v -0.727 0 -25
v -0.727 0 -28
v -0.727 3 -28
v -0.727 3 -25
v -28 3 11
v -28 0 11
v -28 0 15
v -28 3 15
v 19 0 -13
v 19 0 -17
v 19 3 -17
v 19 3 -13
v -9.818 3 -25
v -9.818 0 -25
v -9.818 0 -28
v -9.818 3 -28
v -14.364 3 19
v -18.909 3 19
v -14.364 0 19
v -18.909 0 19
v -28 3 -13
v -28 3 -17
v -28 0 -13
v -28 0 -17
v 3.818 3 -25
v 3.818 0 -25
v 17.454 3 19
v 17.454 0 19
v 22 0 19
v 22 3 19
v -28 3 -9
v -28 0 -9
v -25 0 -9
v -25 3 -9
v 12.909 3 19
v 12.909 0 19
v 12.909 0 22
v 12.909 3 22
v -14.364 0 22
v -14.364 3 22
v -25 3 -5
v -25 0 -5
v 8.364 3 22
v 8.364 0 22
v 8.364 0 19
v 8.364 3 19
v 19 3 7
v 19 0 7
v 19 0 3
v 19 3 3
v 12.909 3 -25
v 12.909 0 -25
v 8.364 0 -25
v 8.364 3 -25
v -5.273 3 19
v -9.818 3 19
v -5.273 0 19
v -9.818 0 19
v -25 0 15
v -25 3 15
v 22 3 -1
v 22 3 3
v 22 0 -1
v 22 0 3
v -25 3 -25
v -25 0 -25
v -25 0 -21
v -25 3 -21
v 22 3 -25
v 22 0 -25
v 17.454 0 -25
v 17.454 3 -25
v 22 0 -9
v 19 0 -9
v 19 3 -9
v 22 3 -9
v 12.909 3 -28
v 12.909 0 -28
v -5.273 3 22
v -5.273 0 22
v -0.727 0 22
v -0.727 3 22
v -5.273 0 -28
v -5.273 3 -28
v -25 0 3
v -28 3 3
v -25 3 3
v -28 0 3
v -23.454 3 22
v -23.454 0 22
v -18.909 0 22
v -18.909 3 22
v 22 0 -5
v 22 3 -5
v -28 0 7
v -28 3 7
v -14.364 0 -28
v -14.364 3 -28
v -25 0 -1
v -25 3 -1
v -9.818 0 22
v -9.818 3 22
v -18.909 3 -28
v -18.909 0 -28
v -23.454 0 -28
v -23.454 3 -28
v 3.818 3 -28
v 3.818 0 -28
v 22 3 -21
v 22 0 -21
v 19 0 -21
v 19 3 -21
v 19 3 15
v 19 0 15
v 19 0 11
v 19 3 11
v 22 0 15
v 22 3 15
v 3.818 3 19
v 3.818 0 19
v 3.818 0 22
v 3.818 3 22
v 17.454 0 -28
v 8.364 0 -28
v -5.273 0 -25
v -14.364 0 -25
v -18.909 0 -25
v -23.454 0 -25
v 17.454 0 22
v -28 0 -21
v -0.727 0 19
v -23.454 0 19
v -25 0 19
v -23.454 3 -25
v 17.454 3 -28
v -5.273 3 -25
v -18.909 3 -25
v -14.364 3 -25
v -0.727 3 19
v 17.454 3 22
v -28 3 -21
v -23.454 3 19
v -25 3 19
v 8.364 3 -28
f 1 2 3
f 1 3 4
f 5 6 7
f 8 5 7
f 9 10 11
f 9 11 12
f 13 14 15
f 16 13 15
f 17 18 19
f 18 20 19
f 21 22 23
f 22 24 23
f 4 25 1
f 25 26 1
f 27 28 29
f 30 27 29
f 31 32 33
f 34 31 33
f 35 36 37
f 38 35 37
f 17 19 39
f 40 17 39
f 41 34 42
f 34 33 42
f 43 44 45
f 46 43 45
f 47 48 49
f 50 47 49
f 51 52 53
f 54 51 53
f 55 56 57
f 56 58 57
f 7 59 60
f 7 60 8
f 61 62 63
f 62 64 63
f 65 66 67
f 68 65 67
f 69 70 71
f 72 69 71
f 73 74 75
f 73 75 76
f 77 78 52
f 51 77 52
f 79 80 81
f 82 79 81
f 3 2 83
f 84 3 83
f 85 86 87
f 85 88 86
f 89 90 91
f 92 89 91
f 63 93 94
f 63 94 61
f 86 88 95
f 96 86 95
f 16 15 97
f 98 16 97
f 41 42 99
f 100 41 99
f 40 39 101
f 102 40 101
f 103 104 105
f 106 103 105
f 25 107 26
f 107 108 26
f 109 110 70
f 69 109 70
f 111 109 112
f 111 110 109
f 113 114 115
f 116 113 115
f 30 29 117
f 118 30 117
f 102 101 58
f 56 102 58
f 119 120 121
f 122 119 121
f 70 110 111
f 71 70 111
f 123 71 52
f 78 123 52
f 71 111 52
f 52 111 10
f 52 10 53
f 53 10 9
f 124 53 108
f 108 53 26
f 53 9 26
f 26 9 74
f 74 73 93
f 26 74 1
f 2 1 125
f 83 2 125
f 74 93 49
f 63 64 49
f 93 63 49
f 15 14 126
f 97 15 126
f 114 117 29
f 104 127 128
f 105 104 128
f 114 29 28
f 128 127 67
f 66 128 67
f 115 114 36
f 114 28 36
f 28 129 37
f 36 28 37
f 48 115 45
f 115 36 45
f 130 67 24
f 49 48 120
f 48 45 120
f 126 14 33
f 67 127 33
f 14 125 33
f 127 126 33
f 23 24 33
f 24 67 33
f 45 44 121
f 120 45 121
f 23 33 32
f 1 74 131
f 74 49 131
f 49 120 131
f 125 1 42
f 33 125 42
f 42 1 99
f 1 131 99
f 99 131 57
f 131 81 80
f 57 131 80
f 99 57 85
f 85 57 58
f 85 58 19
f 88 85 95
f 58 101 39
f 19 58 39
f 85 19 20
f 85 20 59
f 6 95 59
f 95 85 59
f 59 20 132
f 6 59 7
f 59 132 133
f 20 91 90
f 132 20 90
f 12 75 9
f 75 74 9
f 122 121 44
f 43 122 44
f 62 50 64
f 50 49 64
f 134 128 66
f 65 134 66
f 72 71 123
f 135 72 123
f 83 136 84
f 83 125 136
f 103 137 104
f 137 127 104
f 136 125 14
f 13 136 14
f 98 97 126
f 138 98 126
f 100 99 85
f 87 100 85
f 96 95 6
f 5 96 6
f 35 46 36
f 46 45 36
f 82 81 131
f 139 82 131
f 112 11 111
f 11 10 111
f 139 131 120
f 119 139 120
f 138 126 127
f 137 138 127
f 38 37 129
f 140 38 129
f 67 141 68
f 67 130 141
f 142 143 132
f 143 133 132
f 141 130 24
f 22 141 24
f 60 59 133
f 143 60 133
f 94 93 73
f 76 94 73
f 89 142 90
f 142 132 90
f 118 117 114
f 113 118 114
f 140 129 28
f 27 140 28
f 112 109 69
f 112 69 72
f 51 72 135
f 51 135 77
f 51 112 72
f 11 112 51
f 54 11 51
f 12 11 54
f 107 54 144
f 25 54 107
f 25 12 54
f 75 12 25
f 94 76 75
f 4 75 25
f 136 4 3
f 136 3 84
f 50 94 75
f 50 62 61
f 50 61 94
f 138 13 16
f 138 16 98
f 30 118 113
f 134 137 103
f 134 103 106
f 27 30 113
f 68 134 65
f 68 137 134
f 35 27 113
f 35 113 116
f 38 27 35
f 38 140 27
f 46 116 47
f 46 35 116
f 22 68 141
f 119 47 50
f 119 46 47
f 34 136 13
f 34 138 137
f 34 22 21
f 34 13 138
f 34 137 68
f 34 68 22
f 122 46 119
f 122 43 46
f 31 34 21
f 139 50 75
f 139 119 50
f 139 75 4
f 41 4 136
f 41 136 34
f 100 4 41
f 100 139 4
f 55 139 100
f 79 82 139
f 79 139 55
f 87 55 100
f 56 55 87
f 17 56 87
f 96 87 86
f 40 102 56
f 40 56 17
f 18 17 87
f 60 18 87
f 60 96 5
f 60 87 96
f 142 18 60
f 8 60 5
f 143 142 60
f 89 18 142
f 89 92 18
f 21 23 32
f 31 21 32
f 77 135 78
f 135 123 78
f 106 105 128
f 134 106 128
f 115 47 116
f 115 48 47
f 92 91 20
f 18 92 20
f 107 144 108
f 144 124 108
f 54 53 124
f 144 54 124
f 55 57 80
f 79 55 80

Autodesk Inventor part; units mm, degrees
ref_plane "YZ Plane" through (0, 0, 0) normal (1, 0, 0) x (0, 1, 0)
ref_plane "XZ Plane" through (0, 0, 0) normal (0, 1, 0) x (-1, 0, 0)
ref_plane "XY Plane" through (0, 0, 0) normal (0, 0, 1) x (1, 0, 0)
sketch "Sketch1" plane through (0, 0, 0) normal (0, 1, 0) x (-1, 0, 0)
  line L0 (23.4545, 19) -> (23.4545, 22)
  line L1 (18.9091, 22) -> (18.9091, 19)
  line L2 (14.3636, 19) -> (14.3636, 22)
  line L3 (9.8182, 22) -> (9.8182, 19)
  line L4 (5.2727, 19) -> (5.2727, 22)
  line L5 (0.7273, 22) -> (0.7273, 19)
  line L6 (-3.8182, 19) -> (-3.8182, 22)
  line L7 (-8.3636, 22) -> (-8.3636, 19)
  line L8 (-12.9091, 19) -> (-12.9091, 22)
  line L9 (-17.4545, 22) -> (-17.4545, 19)
  line L10 (-22, 15) -> (-19, 15)
  line L11 (-19, 3) -> (-22, 3)
  line L12 (-19, -9) -> (-22, -9)
  line L13 (-22, -21) -> (-19, -21)
  line L14 (-17.4545, -25) -> (-17.4545, -28)
  line L15 (-12.9091, -28) -> (-12.9091, -25)
  line L16 (-8.3636, -25) -> (-8.3636, -28)
  line L17 (-3.8182, -28) -> (-3.8182, -25)
  line L18 (0.7273, -28) -> (0.7273, -25)
  line L19 (5.2727, -25) -> (5.2727, -28)
  line L20 (23.4545, -28) -> (23.4545, -25)
  line L21 (18.9091, -25) -> (18.9091, -28)
  line L22 (14.3636, -28) -> (14.3636, -25)
  line L23 (9.8182, -25) -> (9.8182, -28)
  line L24 (28, -21) -> (25, -21)
  line L25 (25, 15) -> (28, 15)
  line L26 (28, 3) -> (25, 3)
  line L27 (18.9091, -28) -> (23.4545, -28)
  line L28 (9.8182, -28) -> (14.3636, -28)
  line L29 (0.7273, -28) -> (5.2727, -28)
  line L30 (28, -21) -> (28, -17)
  line L31 (28, 3) -> (28, 7)
  line L32 (28, 11) -> (28, 15)
  line L33 (23.4545, 22) -> (18.9091, 22)
  line L34 (14.3636, 22) -> (9.8182, 22)
  line L35 (5.2727, 22) -> (0.7273, 22)
  line L36 (-3.8182, 22) -> (-8.3636, 22)
  line L37 (-12.9091, 22) -> (-17.4545, 22)
  line L38 (-19, 15) -> (-19, 11)
  line L39 (-19, 7) -> (-19, 3)
  line L40 (-22, 3) -> (-22, -1)
  line L41 (-22, 19) -> (-22, 15)
  line L42 (-17.4545, -28) -> (-12.9091, -28)
  line L43 (-8.3636, -28) -> (-3.8182, -28)
  line L44 (-19, -9) -> (-19, -13)
  line L45 (-19, -17) -> (-19, -21)
  line L46 (-22, -5) -> (-22, -9)
  line L47 (-22, -21) -> (-22, -25)
  line L48 (-22, -25) -> (-17.4545, -25)
  line L49 (-12.9091, -25) -> (-8.3636, -25)
  line L50 (-3.8182, -25) -> (0.7273, -25)
  line L51 (5.2727, -25) -> (9.8182, -25)
  line L52 (14.3636, -25) -> (18.9091, -25)
  line L53 (23.4545, -25) -> (25, -25)
  line L54 (25, -25) -> (25, -21)
  line L55 (25, -1) -> (25, 3)
  line L56 (25, 15) -> (25, 19)
  line L57 (25, 19) -> (23.4545, 19)
  line L58 (18.9091, 19) -> (14.3636, 19)
  line L59 (9.8182, 19) -> (5.2727, 19)
  line L60 (0.7273, 19) -> (-3.8182, 19)
  line L61 (-8.3636, 19) -> (-12.9091, 19)
  line L62 (-17.4545, 19) -> (-22, 19)
  line L63 (28, -13) -> (28, -9)
  line L64 (28, -9) -> (25, -9)
  line L65 (25, -9) -> (25, -5)
  line L66 (-19, -17) -> (-19, -13)
  line L67 (-22, -5) -> (-22, -1)
  line L68 (-19, 7) -> (-19, 11)
  line L69 (28, -17) -> (28, -13)
  line L70 (25, -5) -> (25, -1)
  line L71 (28, 7) -> (28, 11)
  point P0 (0, 0)
  point P1 (-219, 16.6364)
  point P2 (-222, -22.6364)
  point P3 (228, -22.6364)
  point P4 (-11.5, 9)
  point P5 (-11.5, 6.8182)
  point P6 (-14.5, 0.2727)
  point P7 (-11.5, -6.2727)
  point P8 (20.5, -12.8182)
  point P9 (20.5, -10.6364)
  point P10 (17.5, -3.0455)
  point P11 (17.5, -2.9545)
  point P12 (-11.5, 6.8182)
  point P13 (-14.5, 6.8182)
  point P14 (-14.5, 5)
  point P15 (-14.5, 9)
  dimension "d1" = 47
  dimension "d3" = 44
  dimension "d5" = 25
  dimension "d6" = 25
  dimension "d9" = 3
  dimension "d15" = 3
  dimension "d16" = 3
  dimension "d17" = 3
  dimension "d18" = 12
  dimension "d19" = 12
  dimension "d20" = 12
  dimension "d21" = 4
  dimension "d23" = 4.5454
extrude "Extrusion1" add sketch "Sketch1" along normal blind 3
equation "\"d1\" = wt - tt"
equation "\"d3\" = -2 * tt + ht"
equation "\"d5\" = 0.5 * ht"
equation "\"d6\" = 0.5 * wt"
equation "\"d9\" = tt"
equation "\"d15\" = tt"
equation "\"d16\" = tt"
equation "\"d17\" = tt"
equation "\"d18\" = 0.272727 * ht - 0.545455 * tt"
equation "\"d19\" = d18"
equation "\"d20\" = d18"
equation "\"d21\" = -0.181818 * tt + 0.0909091 * ht"
equation "\"d23\" = 0.0909091 * wt"
equation "\"d13\" = tt"
equation "\"wt\" = 50"
equation "\"tt\" = 3"
equation "\"tol\" = 0"
equation "\"tiroir\" = 25.4"
equation "\"nHoles\" = 101.6"
equation "\"shelfH\" = 35"
equation "\"d0\" = 0.5 * wt"
equation "\"d2\" = 0.5 * lt"
equation "\"d4\" = tt"
equation "\"ht\" = 50"
equation "\"lt\" = 50"
properties part number "base"
